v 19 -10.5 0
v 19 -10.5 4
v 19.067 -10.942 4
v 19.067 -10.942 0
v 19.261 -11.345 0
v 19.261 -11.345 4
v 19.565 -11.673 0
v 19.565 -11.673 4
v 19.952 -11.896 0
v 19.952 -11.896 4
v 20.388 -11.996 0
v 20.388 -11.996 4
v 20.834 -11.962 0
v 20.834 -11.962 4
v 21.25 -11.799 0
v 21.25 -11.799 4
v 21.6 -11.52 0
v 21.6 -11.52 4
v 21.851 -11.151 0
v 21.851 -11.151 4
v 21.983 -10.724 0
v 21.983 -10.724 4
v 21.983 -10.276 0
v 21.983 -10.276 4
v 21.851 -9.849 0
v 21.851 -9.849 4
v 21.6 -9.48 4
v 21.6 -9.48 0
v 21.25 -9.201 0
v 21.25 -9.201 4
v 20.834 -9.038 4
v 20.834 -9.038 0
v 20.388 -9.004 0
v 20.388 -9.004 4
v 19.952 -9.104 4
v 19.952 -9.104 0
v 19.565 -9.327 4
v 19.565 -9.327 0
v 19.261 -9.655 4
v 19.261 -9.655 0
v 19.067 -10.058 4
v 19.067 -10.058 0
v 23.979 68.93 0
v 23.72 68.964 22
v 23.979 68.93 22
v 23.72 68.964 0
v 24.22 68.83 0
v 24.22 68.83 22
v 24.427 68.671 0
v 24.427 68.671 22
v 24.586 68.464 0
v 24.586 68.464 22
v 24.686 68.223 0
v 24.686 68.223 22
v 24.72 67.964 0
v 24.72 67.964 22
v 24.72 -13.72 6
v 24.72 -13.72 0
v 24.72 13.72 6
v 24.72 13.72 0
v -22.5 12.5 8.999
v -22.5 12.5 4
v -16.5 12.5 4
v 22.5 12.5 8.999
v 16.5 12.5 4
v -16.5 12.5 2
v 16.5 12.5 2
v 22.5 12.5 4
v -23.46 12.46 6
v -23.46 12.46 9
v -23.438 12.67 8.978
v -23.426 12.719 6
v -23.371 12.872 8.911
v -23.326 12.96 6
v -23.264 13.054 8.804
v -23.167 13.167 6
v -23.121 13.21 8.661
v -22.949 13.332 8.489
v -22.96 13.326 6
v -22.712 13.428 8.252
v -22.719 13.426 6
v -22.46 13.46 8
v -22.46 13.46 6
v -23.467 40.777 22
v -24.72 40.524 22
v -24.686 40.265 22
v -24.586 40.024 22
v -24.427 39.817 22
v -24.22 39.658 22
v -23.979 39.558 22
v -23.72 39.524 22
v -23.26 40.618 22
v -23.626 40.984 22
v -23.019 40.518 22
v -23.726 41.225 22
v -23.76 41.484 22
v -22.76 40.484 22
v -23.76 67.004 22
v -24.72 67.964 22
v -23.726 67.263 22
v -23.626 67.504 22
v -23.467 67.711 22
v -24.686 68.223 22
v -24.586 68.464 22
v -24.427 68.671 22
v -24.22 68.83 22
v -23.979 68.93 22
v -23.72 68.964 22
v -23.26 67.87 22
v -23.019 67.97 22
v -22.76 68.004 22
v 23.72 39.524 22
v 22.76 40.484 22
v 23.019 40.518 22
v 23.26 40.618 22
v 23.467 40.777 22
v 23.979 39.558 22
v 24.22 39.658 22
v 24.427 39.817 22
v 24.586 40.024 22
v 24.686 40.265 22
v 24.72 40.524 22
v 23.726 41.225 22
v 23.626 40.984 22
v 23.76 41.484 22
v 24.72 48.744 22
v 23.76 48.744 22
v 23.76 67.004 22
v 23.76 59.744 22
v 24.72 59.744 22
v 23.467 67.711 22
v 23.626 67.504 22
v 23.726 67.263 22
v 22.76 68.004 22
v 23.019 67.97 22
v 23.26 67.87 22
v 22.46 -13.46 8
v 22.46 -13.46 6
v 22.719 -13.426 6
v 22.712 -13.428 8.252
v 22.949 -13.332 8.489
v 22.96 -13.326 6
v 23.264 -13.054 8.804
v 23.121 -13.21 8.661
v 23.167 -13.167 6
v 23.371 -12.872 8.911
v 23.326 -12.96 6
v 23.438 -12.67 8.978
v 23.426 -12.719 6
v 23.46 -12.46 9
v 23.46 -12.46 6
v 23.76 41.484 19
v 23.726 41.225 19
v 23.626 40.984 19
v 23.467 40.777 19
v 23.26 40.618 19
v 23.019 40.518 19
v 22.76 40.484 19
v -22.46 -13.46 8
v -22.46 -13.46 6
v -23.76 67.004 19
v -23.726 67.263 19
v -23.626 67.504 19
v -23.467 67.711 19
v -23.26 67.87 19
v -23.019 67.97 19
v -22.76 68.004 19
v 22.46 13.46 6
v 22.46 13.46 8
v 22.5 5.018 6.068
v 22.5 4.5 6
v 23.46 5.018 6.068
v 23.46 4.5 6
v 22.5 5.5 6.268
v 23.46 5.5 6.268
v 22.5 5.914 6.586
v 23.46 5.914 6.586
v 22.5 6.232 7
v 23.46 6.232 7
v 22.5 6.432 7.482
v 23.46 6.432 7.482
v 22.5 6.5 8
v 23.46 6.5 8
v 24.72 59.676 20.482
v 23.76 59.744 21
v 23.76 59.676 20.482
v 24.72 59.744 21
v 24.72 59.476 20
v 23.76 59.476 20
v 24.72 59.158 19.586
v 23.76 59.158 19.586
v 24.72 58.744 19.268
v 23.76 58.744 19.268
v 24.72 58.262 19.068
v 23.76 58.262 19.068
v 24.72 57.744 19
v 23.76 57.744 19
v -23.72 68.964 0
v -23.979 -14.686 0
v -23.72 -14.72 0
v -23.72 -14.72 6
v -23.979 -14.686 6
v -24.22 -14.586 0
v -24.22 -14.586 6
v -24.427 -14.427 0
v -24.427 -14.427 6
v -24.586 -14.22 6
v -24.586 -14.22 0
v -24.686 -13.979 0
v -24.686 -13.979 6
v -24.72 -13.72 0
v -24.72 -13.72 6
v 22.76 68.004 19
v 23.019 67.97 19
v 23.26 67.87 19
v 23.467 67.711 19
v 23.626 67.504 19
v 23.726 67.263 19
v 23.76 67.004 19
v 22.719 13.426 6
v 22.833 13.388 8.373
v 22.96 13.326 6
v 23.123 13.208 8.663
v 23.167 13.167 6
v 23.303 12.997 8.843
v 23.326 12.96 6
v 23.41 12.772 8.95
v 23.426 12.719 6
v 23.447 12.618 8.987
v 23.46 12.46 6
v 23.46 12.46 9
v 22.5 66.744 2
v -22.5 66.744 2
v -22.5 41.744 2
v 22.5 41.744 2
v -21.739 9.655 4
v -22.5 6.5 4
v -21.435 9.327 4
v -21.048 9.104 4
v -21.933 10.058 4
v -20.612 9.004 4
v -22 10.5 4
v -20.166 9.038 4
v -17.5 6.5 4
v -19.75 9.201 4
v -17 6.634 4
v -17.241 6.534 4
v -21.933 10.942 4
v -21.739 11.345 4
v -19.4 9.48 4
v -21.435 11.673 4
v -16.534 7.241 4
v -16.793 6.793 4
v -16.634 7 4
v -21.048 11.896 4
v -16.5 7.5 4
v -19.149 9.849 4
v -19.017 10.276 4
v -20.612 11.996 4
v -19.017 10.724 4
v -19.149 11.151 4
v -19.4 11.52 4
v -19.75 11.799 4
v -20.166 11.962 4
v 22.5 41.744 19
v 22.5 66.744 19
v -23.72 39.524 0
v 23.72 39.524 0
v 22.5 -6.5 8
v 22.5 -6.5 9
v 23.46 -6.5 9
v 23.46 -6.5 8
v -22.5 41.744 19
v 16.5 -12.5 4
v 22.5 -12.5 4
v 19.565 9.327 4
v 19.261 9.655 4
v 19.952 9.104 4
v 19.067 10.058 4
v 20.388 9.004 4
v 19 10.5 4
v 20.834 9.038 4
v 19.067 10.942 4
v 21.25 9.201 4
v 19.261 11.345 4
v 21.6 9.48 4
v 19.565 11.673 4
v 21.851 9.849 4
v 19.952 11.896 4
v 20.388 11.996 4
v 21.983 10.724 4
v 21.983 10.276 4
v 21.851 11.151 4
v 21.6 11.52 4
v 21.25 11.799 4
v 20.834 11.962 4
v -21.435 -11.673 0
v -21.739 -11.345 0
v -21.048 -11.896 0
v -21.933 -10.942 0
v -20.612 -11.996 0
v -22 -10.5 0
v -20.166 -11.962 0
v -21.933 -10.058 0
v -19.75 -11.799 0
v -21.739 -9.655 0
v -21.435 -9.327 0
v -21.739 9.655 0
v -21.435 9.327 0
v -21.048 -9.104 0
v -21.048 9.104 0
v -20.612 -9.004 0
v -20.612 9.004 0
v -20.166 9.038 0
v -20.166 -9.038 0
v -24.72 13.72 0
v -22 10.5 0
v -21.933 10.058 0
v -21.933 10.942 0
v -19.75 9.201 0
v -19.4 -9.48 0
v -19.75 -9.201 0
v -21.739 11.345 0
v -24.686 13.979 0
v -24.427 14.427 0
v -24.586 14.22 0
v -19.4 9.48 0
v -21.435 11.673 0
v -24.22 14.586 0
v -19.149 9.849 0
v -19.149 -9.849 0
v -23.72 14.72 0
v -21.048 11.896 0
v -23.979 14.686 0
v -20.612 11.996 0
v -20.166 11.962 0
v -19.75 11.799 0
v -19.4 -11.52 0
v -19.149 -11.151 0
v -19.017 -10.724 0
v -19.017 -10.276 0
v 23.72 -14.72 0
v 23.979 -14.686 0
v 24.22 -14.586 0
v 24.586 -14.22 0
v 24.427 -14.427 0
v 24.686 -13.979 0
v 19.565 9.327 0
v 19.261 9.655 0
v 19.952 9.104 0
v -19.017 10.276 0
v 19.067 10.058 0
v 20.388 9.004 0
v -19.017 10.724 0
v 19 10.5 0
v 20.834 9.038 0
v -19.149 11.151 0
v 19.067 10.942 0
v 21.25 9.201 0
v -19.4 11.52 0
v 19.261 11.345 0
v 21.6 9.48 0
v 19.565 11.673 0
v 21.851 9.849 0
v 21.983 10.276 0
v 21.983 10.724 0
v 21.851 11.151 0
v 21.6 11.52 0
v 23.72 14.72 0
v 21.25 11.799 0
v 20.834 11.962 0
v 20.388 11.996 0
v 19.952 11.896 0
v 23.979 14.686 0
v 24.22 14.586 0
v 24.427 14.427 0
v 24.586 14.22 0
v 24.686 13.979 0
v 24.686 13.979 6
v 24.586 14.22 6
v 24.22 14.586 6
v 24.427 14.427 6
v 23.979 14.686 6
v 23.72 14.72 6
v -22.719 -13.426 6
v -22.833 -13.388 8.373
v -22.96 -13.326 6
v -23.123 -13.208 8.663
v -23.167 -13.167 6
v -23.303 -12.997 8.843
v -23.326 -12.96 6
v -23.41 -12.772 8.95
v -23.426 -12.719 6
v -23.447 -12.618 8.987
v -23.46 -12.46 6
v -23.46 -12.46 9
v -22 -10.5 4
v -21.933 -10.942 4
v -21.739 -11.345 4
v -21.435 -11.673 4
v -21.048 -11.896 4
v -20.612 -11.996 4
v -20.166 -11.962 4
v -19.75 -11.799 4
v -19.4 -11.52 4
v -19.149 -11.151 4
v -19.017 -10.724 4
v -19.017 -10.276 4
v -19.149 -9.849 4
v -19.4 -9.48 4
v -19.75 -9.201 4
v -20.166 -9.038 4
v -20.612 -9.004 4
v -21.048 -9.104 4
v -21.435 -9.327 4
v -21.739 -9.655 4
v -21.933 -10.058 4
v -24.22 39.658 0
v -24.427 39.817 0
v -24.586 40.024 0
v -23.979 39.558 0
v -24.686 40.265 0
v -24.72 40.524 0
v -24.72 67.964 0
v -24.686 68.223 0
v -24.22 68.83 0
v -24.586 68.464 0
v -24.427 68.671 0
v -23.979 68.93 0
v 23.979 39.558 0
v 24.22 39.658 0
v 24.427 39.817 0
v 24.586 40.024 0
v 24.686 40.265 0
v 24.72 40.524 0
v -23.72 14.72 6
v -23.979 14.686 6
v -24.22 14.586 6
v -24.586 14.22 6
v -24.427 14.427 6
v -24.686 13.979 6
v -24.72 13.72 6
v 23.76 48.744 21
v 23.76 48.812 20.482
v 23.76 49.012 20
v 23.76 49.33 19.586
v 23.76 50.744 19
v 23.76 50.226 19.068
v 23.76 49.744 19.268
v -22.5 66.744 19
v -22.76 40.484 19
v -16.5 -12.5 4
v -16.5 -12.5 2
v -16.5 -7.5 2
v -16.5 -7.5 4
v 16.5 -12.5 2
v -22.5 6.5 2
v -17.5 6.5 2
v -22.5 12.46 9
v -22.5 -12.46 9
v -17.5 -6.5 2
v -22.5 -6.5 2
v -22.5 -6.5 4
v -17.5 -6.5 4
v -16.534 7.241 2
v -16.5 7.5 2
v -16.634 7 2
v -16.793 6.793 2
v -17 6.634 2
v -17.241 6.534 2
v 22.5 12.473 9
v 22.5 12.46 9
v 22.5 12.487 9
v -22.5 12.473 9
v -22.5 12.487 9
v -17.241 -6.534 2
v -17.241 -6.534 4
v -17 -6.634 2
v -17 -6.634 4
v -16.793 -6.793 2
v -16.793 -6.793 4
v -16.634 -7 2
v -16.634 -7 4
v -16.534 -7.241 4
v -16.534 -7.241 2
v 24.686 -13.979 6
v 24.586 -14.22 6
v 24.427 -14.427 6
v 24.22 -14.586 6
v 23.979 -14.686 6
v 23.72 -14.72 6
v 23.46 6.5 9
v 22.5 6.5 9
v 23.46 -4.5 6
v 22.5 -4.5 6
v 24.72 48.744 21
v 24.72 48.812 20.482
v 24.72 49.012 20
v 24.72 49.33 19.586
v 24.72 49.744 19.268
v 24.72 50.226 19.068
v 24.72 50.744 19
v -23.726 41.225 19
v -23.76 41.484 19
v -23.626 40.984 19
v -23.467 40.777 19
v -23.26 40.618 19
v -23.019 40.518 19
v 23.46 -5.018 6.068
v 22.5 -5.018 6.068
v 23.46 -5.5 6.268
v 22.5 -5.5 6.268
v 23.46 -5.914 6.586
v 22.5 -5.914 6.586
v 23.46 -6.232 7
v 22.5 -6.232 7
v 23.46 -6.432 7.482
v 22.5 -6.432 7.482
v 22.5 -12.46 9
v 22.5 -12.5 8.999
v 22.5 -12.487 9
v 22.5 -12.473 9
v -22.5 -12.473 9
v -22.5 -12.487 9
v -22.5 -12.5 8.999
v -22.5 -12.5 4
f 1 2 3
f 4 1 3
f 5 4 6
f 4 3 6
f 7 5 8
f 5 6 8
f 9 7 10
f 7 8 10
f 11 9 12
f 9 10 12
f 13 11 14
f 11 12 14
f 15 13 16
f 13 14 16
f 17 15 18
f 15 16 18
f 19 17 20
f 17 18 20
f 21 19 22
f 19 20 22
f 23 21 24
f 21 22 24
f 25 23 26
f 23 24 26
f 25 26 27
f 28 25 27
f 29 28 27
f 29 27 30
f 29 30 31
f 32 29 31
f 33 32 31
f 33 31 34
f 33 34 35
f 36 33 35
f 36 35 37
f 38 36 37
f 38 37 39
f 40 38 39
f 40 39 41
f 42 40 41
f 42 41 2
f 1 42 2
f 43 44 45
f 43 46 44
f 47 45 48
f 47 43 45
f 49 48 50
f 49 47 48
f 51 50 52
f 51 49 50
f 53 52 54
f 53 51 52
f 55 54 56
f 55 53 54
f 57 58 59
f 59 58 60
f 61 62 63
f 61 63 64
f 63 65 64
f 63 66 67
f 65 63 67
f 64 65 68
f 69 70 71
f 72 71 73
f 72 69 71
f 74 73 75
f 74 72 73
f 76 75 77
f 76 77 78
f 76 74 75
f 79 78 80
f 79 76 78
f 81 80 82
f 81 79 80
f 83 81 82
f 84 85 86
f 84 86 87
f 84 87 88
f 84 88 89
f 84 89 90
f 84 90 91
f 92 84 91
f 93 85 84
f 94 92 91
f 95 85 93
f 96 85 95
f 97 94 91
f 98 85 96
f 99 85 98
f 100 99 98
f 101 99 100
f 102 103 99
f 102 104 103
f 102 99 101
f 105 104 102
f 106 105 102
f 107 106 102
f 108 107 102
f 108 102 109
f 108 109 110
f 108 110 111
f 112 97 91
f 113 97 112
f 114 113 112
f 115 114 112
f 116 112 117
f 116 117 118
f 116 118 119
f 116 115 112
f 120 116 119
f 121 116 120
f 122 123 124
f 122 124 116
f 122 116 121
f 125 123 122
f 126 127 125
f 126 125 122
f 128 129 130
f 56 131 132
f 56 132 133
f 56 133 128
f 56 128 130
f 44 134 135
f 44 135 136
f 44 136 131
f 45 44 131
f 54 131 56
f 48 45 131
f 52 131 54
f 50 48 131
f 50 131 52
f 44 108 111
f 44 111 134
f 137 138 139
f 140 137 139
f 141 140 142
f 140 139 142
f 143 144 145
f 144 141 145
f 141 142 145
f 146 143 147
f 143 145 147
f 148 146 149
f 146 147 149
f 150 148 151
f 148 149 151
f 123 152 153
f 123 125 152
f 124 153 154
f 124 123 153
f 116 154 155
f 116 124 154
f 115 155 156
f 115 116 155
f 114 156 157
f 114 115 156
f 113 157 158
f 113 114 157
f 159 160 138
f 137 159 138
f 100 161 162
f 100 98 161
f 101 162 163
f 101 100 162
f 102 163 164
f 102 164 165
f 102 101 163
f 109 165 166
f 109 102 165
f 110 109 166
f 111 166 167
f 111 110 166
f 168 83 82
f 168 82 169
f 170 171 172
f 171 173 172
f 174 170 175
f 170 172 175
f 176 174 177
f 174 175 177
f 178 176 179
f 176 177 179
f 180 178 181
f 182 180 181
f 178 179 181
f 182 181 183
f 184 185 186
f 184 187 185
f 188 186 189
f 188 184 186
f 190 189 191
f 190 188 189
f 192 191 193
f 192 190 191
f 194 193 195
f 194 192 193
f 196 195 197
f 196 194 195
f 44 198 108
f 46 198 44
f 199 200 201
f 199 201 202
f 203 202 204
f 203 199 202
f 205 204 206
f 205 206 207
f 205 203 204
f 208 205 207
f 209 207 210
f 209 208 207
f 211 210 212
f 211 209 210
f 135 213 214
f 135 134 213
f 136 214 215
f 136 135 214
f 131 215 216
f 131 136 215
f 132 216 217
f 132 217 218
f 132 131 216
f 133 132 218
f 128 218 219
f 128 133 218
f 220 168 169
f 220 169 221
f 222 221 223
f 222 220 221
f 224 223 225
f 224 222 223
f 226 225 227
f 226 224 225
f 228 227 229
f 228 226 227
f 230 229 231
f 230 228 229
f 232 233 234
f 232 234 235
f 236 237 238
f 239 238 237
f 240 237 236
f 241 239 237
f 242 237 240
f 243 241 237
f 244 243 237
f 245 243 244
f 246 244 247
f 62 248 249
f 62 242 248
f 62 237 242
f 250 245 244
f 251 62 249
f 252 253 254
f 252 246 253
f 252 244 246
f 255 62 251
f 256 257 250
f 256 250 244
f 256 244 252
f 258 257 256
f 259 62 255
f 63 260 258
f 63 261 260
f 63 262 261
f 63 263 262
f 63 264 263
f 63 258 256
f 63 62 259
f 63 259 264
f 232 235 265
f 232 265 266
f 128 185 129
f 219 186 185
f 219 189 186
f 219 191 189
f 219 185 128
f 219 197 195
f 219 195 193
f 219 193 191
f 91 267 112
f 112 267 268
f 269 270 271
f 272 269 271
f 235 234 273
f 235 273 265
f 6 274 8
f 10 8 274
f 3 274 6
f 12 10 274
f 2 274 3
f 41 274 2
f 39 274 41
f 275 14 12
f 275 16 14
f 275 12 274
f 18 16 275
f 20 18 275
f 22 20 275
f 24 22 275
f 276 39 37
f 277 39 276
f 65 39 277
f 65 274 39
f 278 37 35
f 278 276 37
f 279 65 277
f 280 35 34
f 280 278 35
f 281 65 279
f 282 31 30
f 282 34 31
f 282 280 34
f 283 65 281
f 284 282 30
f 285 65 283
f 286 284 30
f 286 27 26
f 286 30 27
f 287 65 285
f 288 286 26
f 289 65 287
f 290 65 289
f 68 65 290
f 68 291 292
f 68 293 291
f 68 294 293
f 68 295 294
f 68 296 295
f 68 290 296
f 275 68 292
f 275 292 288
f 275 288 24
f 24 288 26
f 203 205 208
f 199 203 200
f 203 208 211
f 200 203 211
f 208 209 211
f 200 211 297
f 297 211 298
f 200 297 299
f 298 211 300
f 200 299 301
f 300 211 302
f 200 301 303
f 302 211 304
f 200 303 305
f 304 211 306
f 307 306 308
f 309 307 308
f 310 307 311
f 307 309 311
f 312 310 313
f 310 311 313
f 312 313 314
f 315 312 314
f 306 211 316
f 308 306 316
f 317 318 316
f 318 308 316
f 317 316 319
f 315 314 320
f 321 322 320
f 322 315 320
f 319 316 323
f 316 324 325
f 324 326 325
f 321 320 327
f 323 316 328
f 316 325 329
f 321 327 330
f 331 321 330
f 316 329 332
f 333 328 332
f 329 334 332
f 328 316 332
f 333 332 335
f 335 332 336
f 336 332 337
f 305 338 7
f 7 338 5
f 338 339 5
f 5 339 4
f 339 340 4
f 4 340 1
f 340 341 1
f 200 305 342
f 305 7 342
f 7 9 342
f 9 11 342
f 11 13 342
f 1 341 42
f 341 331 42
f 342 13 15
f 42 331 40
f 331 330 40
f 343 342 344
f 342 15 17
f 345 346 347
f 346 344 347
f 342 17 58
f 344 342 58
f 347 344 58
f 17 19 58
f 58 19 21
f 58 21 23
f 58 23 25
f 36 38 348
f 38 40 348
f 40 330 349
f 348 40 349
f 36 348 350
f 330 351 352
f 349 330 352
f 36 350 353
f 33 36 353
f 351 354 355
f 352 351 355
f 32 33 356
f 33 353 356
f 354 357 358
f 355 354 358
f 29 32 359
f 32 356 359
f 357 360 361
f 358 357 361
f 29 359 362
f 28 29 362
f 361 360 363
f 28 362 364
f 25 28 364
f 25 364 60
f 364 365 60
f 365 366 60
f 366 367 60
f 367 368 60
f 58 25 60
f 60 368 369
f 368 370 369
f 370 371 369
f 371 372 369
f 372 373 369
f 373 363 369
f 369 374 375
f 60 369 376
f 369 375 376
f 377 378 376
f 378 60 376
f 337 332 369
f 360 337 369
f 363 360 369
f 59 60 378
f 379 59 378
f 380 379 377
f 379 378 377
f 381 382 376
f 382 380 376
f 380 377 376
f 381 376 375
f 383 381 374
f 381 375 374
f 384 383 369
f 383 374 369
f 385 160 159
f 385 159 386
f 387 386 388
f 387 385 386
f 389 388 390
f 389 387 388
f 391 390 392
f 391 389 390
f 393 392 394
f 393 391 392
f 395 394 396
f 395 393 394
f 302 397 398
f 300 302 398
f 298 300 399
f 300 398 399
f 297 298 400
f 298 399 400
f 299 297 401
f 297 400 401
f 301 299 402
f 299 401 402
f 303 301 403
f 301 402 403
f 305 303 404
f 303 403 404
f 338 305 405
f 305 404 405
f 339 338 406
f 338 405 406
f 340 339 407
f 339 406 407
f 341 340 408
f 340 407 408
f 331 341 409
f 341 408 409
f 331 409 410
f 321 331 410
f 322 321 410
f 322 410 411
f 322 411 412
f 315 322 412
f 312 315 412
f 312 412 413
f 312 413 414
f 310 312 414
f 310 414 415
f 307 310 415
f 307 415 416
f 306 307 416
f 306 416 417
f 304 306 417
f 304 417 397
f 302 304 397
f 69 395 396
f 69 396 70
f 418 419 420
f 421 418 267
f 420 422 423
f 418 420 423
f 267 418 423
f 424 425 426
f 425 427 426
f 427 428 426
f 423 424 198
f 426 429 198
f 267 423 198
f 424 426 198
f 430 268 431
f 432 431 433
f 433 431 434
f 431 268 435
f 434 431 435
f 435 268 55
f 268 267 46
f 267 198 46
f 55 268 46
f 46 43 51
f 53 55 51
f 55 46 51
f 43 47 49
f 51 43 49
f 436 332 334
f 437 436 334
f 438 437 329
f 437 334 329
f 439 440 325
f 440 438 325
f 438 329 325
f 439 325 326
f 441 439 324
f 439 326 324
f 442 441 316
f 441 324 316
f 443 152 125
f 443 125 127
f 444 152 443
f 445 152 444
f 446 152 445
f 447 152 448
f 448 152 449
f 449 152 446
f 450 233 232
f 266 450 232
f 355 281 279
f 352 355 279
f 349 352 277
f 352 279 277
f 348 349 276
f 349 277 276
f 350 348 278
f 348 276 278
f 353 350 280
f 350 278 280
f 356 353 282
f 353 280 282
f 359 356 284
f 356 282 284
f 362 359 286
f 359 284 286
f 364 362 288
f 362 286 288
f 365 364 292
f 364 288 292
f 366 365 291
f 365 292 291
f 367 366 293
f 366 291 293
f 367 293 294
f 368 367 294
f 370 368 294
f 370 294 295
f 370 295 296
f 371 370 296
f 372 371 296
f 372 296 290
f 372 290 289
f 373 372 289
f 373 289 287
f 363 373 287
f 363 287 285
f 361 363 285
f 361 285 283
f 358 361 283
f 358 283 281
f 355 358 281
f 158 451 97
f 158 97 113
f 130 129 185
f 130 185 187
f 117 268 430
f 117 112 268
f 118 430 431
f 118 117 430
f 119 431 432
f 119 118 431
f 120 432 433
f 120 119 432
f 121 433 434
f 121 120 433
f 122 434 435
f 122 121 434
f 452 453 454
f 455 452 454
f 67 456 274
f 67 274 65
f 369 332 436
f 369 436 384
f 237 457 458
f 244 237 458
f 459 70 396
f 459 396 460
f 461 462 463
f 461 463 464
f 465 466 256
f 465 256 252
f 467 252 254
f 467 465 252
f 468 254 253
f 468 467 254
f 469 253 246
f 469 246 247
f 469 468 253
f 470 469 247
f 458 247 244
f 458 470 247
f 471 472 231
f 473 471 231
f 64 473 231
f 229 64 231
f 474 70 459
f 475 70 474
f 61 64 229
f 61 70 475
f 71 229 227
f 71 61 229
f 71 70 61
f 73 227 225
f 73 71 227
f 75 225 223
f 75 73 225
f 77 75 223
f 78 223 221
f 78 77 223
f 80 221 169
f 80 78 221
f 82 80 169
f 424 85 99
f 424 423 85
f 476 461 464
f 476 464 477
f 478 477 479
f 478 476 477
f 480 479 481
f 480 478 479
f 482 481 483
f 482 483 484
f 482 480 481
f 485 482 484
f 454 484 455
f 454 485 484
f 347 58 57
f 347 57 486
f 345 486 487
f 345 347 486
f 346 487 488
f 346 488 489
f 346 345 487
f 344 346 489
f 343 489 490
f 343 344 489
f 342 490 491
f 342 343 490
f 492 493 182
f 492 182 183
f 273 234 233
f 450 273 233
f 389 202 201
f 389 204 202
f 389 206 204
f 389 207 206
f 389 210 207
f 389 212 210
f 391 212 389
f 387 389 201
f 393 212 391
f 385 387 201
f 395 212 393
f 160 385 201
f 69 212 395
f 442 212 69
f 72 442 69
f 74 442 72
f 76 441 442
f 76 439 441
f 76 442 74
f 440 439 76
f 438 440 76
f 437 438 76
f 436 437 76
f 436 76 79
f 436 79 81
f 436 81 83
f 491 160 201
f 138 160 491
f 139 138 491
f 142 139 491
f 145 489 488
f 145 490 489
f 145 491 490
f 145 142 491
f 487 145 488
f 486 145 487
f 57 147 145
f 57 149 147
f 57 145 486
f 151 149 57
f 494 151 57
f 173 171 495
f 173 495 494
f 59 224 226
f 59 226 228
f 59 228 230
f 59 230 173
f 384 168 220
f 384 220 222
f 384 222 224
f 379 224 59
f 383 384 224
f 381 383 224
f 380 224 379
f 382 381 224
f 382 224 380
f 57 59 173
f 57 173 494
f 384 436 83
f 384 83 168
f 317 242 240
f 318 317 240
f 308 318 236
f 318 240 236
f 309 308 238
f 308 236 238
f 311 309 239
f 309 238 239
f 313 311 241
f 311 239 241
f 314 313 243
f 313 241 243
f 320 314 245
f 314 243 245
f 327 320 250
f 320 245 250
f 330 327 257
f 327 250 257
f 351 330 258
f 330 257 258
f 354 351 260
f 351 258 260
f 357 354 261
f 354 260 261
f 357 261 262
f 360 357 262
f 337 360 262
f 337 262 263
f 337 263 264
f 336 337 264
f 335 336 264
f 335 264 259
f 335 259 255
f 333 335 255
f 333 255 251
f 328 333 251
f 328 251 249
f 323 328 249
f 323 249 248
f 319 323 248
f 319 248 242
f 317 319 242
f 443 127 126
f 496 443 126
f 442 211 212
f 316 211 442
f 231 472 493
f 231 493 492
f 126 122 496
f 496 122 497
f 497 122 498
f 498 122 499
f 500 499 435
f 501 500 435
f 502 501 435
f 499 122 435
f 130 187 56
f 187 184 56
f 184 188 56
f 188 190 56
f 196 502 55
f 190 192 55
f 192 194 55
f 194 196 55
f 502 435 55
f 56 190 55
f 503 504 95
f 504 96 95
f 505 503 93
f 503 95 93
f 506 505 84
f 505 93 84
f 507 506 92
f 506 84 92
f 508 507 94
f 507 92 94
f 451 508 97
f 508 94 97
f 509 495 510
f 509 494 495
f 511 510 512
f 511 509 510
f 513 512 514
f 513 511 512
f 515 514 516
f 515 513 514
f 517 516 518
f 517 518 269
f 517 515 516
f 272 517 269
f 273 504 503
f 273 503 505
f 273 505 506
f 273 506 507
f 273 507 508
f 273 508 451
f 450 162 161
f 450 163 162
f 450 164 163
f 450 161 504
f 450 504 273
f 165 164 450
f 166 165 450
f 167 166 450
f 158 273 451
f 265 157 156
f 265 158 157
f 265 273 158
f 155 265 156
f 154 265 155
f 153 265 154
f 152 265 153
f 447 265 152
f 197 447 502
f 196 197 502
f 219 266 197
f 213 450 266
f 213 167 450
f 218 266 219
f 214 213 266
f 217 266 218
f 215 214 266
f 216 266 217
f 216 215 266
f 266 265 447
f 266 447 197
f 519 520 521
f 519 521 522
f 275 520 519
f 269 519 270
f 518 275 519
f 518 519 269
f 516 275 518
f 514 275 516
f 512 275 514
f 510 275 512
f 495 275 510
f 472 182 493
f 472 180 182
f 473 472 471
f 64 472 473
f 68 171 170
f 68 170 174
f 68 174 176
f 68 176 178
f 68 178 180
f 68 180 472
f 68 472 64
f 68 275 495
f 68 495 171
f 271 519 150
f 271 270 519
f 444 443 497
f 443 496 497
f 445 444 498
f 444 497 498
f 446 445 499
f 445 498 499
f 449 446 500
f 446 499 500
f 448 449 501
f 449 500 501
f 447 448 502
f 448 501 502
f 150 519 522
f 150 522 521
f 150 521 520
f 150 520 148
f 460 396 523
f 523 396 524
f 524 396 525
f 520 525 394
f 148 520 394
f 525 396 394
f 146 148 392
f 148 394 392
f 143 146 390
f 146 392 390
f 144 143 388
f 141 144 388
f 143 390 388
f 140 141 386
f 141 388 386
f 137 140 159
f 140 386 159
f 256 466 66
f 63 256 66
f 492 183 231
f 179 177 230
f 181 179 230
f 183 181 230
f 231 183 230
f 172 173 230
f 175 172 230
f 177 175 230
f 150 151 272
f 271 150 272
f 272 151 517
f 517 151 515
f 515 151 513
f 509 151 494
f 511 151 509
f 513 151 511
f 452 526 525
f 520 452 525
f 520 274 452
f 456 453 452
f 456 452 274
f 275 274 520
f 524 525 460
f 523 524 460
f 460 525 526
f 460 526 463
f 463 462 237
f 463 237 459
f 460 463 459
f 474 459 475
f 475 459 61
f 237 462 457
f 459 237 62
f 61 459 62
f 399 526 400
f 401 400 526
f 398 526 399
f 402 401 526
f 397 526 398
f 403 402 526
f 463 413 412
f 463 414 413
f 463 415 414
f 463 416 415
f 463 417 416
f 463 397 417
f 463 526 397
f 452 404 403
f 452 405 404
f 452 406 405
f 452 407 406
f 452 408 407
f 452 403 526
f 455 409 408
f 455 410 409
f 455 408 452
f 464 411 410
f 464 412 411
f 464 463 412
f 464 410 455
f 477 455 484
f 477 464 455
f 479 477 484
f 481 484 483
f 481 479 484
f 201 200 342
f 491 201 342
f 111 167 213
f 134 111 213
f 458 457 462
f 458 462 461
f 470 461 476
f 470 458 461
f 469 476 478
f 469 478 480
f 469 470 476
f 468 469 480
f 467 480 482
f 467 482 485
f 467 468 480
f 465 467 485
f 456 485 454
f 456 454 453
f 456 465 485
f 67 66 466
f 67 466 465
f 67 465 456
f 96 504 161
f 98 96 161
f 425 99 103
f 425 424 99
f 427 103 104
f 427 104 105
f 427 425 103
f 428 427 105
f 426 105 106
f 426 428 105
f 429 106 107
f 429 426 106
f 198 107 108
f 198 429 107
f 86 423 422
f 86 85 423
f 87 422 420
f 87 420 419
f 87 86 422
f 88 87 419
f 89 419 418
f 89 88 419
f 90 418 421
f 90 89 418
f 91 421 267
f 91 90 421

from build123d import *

# Parameters (mm, degrees)
F1_DEPTH     = 2
F0_W         = 6
F0_H         = 6
F0_H_2       = 25
F2_DEPTH     = 4
F0_W_2       = 49.44
F0_H_3       = 29.44
F3_DEPTH     = 6
F4_D         = 3
F5_W         = 46.92
F5_H         = 26.92
F5_W_2       = 45
F5_H_2       = 25
F6_DEPTH     = 3
F7_W         = 0.96
F7_H         = 13
F8_DEPTH     = 3
F0_W_3       = 45
F9_DEPTH     = 2
F10_DEPTH    = 19
F11_W        = 49.44
F11_H        = 29.44
F11_W_2      = 47.52
F11_H_2      = 27.52
F12_DEPTH    = 3
F13_T1_DEPTH = 4.5
F13_T3_DEPTH = 5.5
F13_T5_DEPTH = 51.92
F13_T7_DEPTH = 11
F13_2_F1_R   = 1
F13_2_F2_R   = 1
F14_W        = 0.96
F14_H        = 11
F15_DEPTH    = 3
F16_R        = 2
F16_2_R      = 2


# Not quite as in the source:
# - a fillet or chamfer that OpenCascade refuses, or shapes differently, is made with other operations: its cross-section is extruded or revolved along the edge and cut away or added


with BuildPart() as f1:
    # F0 (on Top) → F1 (new body)
    with BuildSketch(Plane.XY):
        Polygon((-16.5, -12.5), (16.5, -12.5), (16.5, 12.5), (-16.5, 12.5), (-16.5, 6.5), (-22.5, 6.5), (-22.5, -6.5), (-16.5, -6.5), align=None)
    extrude(amount=F1_DEPTH)

    # F0 (on Top) → F2 (join)
    with BuildSketch(Plane.XY):
        with Locations((-19.5, 9.5)):
            Rectangle(F0_W, F0_H)
        with Locations((-19.5, -9.5)):
            Rectangle(F0_W, F0_H)
        with Locations((19.5, 0)):
            Rectangle(F0_W, F0_H_2)
    extrude(amount=F2_DEPTH)

    # F0 (on Top) → F3 (join)
    with BuildSketch(Plane.XY):
        Rectangle(F0_W_2, F0_H_3)
        Polygon((22.5, 12.5), (22.5, -12.5), (16.5, -12.5), (-16.5, -12.5), (-22.5, -12.5), (-22.5, -6.5), (-22.5, 6.5), (-22.5, 12.5), (-16.5, 12.5), (16.5, 12.5), align=None, mode=Mode.SUBTRACT)
    extrude(amount=F3_DEPTH)

    # F4 (through all)
    with Locations(Plane(origin=(0, 0, 0), x_dir=(1, 0, 0), z_dir=(0, 0, -1))):
        with Locations((-20.5, 10.5), (20.5, -10.5), (20.5, 10.5), (-20.5, -10.5)):
            Hole(F4_D / 2)

    # F5 (on face) → F6 (join)
    with BuildSketch(Plane.XY.offset(6)):
        Rectangle(F5_W, F5_H)
        Rectangle(F5_W_2, F5_H_2, mode=Mode.SUBTRACT)
    extrude(amount=F6_DEPTH)

    # F7 (on face) → F8 (cut)
    with BuildSketch(Plane.XY.offset(9)):
        with Locations((22.98, 0)):
            Rectangle(F7_W, F7_H)
    extrude(amount=-F8_DEPTH, mode=Mode.SUBTRACT)

    # F13: fillet of radius 1 on 12 edges, made by hand

    # F13_s2 → F13_t1 (cut)
    with BuildSketch(Plane.XY.offset(2)):
        with BuildLine():
            ThreePointArc((-16.5, 7.5), (-16.7928932188, 6.7928932188), (-17.5, 6.5))
            Line((-17.5, 6.5), (-16.5, 6.5))
            Line((-16.5, 6.5), (-16.5, 7.5))
        make_face()
        with BuildLine():
            ThreePointArc((-17.5, -6.5), (-16.7928932188, -6.7928932188), (-16.5, -7.5))
            Line((-16.5, -7.5), (-16.5, -6.5))
            Line((-16.5, -6.5), (-17.5, -6.5))
        make_face()
    extrude(amount=F13_T1_DEPTH, mode=Mode.SUBTRACT)

    # F13_s4 → F13_t3 (cut)
    with BuildSketch(Plane.XY.offset(6)):
        with BuildLine():
            ThreePointArc((-23.46, 12.46), (-23.1671067812, 13.1671067812), (-22.46, 13.46))
            Line((-22.46, 13.46), (-23.46, 13.46))
            Line((-23.46, 13.46), (-23.46, 12.46))
        make_face()
        with BuildLine():
            ThreePointArc((22.46, 13.46), (23.1671067812, 13.1671067812), (23.46, 12.46))
            Line((23.46, 12.46), (23.46, 13.46))
            Line((23.46, 13.46), (22.46, 13.46))
        make_face()
        with BuildLine():
            ThreePointArc((-22.46, -13.46), (-23.1671067812, -13.1671067812), (-23.46, -12.46))
            Line((-23.46, -12.46), (-23.46, -13.46))
            Line((-23.46, -13.46), (-22.46, -13.46))
        make_face()
        with BuildLine():
            ThreePointArc((22.46, -13.46), (23.1671067812, -13.1671067812), (23.46, -12.46))
            Line((23.46, -12.46), (23.46, -13.46))
            Line((23.46, -13.46), (22.46, -13.46))
        make_face()
    extrude(amount=F13_T3_DEPTH, mode=Mode.SUBTRACT)

    # F13_s6 → F13_t5 (cut)
    with BuildSketch(Plane.YZ.offset(-25.96)):
        with BuildLine():
            ThreePointArc((-12.46, 9), (-13.1671067812, 8.7071067812), (-13.46, 8))
            Line((-13.46, 8), (-13.46, 9))
            Line((-13.46, 9), (-12.46, 9))
        make_face()
        with BuildLine():
            ThreePointArc((12.46, 9), (13.1671067812, 8.7071067812), (13.46, 8))
            Line((13.46, 8), (13.46, 9))
            Line((13.46, 9), (12.46, 9))
        make_face()
    extrude(amount=F13_T5_DEPTH, mode=Mode.SUBTRACT)

    # F13_s8 → F13_t7 (cut)
    with BuildSketch(Plane.XY.offset(-2.5)):
        with BuildLine():
            ThreePointArc((-23.72, -14.72), (-24.4271067812, -14.4271067812), (-24.72, -13.72))
            Line((-24.72, -13.72), (-24.72, -14.72))
            Line((-24.72, -14.72), (-23.72, -14.72))
        make_face()
        with BuildLine():
            ThreePointArc((-23.72, 14.72), (-24.4271067812, 14.4271067812), (-24.72, 13.72))
            Line((-24.72, 13.72), (-24.72, 14.72))
            Line((-24.72, 14.72), (-23.72, 14.72))
        make_face()
        with BuildLine():
            ThreePointArc((24.72, -13.72), (24.4271067812, -14.4271067812), (23.72, -14.72))
            Line((23.72, -14.72), (24.72, -14.72))
            Line((24.72, -14.72), (24.72, -13.72))
        make_face()
        with BuildLine():
            ThreePointArc((24.72, 13.72), (24.4271067812, 14.4271067812), (23.72, 14.72))
            Line((23.72, 14.72), (24.72, 14.72))
            Line((24.72, 14.72), (24.72, 13.72))
        make_face()
    extrude(amount=F13_T7_DEPTH, mode=Mode.SUBTRACT)

    # F16
    f16_edges = [f1.edges().sort_by_distance(p)[0] for p in [
        (22.98, 6.5, 6),
        (22.98, -6.5, 6),
    ]]
    fillet(f16_edges, radius=F16_R)


with BuildPart() as f9:
    # F0 (on Top) → F9 (new body)
    with BuildSketch(Plane.XY):
        with Locations((0, 54.2441010475)):
            Rectangle(F0_W_3, F0_H_2)
    extrude(amount=F9_DEPTH)

    # F0 (on Top) → F10 (join)
    with BuildSketch(Plane.XY):
        with Locations((0, 54.2441010475)):
            Rectangle(F0_W_2, F0_H_3)
        with Locations((0, 54.2441010475)):
            Rectangle(F0_W_3, F0_H_2, mode=Mode.SUBTRACT)
    extrude(amount=F10_DEPTH)

    # F11 (on face) → F12 (join)
    with BuildSketch(Plane.XY.offset(19)):
        with Locations((0, 54.2441010475)):
            Rectangle(F11_W, F11_H)
        with Locations((0, 54.2441010475)):
            Rectangle(F11_W_2, F11_H_2, mode=Mode.SUBTRACT)
    extrude(amount=F12_DEPTH)

    # F13#2: fillet of radius 1 on 8 edges, made by hand

    # F13_2_f1
    f13_2_f1_edges = [f9.edges().sort_by_distance(p)[0] for p in [
        (-23.76, 68.0041010475, 20.5),
        (23.76, 68.0041010475, 20.5),
        (23.76, 40.4841010475, 20.5),
        (-23.76, 40.4841010475, 20.5),
    ]]
    fillet(f13_2_f1_edges, radius=F13_2_F1_R)

    # F13_2_f2
    f13_2_f2_edges = [f9.edges().sort_by_distance(p)[0] for p in [
        (-24.72, 39.5241010475, 11),
        (-24.72, 68.9641010475, 11),
        (24.72, 68.9641010475, 11),
        (24.72, 39.5241010475, 11),
    ]]
    fillet(f13_2_f2_edges, radius=F13_2_F2_R)

    # F14 (on face) → F15 (cut)
    with BuildSketch(Plane.XY.offset(22)):
        with Locations((24.24, 54.2441010475)):
            Rectangle(F14_W, F14_H)
    extrude(amount=-F15_DEPTH, mode=Mode.SUBTRACT)

    # F16#2
    f16_2_edges = [f9.edges().sort_by_distance(p)[0] for p in [
        (24.24, 59.744101, 19),
        (24.24, 48.744101, 19),
    ]]
    fillet(f16_2_edges, radius=F16_2_R)


solid = Compound([f1.part, f9.part])
